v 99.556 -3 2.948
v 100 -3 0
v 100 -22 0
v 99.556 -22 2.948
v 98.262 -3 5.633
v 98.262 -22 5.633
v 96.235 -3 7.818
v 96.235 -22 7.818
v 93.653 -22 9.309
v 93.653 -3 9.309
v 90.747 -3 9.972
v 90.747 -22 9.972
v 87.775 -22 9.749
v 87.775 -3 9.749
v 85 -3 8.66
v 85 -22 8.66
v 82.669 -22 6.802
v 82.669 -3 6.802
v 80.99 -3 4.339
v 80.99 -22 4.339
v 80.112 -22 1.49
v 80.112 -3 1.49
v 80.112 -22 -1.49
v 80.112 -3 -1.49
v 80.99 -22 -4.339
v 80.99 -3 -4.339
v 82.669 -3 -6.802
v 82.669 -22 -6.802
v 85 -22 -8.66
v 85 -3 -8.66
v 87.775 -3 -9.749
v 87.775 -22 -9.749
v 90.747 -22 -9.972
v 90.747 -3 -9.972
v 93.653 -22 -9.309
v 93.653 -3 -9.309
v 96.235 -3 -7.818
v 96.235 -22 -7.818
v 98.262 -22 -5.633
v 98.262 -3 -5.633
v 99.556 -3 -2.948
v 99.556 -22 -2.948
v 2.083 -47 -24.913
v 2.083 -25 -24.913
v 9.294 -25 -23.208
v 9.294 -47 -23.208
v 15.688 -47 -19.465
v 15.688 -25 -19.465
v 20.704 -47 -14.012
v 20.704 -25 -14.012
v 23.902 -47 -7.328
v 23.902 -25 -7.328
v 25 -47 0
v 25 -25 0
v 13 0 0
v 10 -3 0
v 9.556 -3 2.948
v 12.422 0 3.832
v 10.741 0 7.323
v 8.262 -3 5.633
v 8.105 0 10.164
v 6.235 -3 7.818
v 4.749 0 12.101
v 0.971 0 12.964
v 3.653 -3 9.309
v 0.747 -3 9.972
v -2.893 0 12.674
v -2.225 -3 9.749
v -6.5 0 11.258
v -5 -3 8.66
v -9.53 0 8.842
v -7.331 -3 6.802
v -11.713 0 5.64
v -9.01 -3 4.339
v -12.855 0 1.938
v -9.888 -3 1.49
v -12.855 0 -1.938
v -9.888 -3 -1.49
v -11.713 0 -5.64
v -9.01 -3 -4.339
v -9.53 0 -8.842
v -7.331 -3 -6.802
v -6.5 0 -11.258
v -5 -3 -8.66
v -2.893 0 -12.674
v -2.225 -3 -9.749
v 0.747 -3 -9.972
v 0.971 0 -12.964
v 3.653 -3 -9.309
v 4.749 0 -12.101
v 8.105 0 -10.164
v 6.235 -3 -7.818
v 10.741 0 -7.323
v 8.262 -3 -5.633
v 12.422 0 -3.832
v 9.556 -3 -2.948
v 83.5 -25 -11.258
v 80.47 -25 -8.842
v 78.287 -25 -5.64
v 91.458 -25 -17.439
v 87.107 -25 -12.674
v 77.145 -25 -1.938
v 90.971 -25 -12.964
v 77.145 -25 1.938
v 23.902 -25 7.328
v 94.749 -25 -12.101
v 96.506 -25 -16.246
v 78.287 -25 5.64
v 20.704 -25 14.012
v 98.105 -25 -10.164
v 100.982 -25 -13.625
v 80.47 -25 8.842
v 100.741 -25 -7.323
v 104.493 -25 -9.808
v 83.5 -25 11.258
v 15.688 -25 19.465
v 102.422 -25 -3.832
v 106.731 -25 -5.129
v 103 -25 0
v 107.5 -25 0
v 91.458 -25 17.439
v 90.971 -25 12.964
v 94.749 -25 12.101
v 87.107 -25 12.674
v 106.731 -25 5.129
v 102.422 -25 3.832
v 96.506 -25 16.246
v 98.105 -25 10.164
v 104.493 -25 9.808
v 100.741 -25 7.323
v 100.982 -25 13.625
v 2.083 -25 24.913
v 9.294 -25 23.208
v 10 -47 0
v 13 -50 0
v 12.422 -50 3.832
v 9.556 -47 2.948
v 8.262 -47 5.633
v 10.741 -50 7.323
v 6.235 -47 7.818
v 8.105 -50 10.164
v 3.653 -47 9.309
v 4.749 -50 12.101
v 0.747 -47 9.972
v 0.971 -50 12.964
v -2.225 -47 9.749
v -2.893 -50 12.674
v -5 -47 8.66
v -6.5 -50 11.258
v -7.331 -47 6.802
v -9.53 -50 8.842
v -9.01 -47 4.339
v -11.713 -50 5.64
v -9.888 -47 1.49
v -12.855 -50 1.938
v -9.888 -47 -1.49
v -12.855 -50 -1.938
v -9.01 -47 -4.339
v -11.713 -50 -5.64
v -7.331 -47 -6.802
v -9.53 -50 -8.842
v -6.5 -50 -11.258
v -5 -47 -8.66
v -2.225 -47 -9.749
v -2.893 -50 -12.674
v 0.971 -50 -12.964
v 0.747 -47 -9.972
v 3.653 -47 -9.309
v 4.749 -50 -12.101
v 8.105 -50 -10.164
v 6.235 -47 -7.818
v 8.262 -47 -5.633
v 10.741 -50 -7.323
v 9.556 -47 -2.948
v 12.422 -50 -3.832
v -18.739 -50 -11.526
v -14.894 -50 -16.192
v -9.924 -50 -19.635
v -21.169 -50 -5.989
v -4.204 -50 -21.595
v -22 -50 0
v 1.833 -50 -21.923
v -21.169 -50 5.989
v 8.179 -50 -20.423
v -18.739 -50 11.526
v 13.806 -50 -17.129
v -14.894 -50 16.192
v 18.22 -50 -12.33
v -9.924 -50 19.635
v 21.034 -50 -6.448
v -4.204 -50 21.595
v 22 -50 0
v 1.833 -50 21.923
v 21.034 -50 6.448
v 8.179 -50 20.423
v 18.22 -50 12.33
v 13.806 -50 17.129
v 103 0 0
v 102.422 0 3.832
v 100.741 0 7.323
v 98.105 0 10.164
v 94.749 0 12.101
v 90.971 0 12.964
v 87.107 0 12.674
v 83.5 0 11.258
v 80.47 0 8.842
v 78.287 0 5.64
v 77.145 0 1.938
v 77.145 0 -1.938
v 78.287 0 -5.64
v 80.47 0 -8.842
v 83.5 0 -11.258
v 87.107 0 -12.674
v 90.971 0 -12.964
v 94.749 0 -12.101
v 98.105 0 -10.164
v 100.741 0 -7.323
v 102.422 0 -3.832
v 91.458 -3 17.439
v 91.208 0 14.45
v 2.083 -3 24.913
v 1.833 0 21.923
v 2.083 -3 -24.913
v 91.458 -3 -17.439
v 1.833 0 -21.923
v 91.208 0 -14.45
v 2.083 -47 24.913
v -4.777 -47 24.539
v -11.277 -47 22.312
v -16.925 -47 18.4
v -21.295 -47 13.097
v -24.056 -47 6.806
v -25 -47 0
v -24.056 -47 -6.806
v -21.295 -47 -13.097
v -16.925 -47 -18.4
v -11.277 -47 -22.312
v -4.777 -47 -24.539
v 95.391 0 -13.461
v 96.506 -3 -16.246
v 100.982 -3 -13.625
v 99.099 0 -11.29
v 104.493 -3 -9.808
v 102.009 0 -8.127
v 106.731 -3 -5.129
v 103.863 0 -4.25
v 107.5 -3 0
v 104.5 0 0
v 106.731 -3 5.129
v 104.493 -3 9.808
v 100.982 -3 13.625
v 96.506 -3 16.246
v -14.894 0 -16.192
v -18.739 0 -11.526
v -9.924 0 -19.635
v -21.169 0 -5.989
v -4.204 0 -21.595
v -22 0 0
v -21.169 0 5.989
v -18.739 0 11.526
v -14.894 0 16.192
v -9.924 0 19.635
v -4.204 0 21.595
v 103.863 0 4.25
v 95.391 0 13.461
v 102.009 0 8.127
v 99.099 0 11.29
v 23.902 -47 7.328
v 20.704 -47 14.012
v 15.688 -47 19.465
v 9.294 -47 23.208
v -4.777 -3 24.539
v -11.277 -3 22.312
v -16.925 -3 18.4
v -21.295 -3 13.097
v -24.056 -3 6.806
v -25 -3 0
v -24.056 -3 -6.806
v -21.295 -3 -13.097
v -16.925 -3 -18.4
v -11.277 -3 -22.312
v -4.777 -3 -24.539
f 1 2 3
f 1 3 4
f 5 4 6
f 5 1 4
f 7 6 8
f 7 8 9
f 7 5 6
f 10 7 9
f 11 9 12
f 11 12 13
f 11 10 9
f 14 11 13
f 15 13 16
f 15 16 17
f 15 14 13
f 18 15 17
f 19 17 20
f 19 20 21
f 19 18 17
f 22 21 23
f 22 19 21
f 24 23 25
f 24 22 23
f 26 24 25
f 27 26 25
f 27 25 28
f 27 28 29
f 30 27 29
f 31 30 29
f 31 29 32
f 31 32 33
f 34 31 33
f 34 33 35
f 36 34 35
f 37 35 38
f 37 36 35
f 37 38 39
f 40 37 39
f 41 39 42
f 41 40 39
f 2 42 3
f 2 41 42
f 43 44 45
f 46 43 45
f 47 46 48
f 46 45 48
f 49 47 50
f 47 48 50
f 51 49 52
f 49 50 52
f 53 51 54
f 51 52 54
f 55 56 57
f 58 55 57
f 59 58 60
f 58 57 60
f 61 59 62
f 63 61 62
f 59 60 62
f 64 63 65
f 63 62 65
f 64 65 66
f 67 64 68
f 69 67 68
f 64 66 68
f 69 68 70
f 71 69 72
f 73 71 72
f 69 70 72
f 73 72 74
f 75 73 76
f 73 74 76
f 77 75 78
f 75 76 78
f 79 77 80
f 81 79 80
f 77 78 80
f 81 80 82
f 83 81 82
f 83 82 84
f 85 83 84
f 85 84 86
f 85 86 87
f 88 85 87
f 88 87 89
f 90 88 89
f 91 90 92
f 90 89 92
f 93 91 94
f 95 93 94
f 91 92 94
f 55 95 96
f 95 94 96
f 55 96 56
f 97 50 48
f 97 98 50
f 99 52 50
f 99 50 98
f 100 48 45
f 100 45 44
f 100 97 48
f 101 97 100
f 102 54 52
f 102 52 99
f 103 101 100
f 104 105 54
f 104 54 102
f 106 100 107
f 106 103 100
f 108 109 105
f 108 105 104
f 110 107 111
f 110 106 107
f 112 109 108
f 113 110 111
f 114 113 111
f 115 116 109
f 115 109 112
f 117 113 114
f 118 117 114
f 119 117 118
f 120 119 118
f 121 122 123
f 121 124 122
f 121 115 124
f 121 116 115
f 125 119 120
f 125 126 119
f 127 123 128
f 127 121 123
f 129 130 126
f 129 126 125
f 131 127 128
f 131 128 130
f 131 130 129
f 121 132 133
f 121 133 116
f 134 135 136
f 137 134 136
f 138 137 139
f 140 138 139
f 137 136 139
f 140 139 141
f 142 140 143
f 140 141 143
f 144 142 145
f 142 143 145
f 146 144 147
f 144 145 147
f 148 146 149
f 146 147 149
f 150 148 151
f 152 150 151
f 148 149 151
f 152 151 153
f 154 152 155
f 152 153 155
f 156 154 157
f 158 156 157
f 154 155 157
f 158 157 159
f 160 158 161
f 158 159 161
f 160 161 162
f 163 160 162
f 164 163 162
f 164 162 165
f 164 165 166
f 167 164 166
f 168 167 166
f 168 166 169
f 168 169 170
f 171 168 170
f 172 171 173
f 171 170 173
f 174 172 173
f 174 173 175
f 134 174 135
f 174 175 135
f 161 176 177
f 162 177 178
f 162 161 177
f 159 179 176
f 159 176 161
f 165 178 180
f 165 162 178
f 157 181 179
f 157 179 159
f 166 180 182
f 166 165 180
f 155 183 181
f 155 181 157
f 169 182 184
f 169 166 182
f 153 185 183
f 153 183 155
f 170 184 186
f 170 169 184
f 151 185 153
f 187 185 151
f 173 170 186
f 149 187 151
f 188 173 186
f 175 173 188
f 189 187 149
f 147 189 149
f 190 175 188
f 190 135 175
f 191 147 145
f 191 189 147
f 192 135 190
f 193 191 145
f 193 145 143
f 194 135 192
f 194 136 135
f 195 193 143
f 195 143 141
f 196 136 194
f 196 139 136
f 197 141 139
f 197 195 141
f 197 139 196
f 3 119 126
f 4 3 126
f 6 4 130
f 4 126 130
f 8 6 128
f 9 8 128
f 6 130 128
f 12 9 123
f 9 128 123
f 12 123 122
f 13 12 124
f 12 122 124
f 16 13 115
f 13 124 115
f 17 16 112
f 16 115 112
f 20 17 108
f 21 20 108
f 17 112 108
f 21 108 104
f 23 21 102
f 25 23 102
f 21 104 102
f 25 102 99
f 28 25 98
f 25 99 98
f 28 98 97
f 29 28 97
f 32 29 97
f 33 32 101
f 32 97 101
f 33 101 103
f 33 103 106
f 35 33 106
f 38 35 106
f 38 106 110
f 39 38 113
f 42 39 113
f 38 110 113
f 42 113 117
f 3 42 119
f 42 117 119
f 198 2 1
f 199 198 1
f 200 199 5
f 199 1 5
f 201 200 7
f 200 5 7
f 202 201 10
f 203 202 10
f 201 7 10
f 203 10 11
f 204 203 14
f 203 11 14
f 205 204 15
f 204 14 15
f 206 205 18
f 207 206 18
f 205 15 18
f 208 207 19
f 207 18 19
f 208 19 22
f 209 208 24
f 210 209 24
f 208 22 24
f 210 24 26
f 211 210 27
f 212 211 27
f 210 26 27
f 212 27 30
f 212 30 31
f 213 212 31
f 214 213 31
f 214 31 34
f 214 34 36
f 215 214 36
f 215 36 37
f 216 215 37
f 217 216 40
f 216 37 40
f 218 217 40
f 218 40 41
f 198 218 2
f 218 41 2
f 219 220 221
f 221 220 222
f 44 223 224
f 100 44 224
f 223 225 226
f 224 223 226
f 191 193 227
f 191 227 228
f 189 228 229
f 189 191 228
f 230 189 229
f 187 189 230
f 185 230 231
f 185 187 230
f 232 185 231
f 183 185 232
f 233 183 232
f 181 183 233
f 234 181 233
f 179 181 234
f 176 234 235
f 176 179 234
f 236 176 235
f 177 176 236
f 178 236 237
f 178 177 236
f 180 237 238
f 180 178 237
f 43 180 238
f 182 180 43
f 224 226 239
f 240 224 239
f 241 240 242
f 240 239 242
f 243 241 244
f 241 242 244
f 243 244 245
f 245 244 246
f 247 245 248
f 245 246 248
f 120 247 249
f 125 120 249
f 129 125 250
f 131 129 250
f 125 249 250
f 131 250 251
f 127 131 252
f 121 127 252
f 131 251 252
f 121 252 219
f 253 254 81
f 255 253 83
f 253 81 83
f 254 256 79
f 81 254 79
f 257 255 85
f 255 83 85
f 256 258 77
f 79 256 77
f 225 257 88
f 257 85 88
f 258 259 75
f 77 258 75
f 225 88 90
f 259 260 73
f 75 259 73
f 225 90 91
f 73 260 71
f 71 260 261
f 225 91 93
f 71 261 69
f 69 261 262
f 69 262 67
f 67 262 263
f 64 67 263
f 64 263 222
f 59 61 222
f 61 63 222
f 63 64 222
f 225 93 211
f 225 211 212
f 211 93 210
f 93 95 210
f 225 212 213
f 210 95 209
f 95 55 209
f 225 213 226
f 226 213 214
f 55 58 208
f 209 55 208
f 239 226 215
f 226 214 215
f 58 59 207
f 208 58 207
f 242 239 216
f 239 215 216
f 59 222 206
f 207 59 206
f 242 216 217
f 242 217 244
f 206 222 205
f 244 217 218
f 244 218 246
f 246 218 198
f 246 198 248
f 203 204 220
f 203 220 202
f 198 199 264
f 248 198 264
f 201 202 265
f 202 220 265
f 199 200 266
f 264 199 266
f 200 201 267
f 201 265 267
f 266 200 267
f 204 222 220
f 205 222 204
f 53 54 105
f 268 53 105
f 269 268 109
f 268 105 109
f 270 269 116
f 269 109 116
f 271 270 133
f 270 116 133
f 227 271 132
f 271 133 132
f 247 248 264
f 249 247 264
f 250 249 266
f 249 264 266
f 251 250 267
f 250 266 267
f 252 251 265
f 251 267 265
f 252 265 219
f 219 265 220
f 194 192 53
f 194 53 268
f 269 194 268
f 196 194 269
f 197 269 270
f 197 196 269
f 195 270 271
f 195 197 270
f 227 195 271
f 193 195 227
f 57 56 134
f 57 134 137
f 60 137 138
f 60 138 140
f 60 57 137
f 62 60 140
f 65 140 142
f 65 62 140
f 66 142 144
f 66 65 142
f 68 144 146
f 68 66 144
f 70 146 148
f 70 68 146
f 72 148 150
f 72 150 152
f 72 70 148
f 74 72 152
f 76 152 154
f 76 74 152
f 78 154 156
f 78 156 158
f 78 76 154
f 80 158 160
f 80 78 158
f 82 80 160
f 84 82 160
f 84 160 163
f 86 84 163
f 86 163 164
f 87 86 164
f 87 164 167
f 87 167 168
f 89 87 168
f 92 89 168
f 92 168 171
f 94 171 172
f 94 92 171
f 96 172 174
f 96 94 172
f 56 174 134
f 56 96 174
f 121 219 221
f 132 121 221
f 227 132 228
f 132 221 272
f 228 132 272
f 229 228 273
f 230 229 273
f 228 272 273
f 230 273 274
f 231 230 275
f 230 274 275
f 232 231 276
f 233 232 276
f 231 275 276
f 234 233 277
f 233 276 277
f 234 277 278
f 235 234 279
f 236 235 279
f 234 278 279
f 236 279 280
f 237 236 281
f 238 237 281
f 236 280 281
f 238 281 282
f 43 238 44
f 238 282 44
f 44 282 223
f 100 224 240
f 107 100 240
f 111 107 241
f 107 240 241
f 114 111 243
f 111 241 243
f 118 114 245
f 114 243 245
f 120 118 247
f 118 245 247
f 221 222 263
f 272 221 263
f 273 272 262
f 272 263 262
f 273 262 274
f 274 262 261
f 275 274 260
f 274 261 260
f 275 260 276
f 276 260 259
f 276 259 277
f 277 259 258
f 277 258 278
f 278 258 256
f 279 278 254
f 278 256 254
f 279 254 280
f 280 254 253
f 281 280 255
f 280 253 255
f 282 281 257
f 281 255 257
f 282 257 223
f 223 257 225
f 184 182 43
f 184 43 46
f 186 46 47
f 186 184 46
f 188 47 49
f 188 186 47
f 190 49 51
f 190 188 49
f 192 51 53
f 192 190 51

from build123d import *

# Parameters (mm, degrees)
F0_R     = 10
F1_DEPTH = 25
F2_DEPTH = 50
F3_SIZE  = 3
F4_SIZE  = 3


with BuildPart() as f1:
    # F0 (on Front) → F1 (new body)
    with BuildSketch(Plane.XZ):
        with BuildLine():
            ThreePointArc((2.083333, -24.913043), (18.399502, -16.92508), (25, 0))
            ThreePointArc((25, 0), (18.399502, 16.92508), (2.083333, 24.913043))
            ThreePointArc((2.083333, 24.913043), (-25, 0), (2.083333, -24.913043))
        make_face()
        Circle(F0_R, mode=Mode.SUBTRACT)
        with BuildLine():
            ThreePointArc((2.083333, 24.913043), (18.399502, 16.92508), (25, 0))
            ThreePointArc((25, 0), (18.399502, -16.92508), (2.083333, -24.913043))
            Line((2.083333, -24.913043), (91.458333, -17.43913))
            ThreePointArc((91.458333, -17.43913), (72.5, 0), (91.458333, 17.43913))
            Line((91.458333, 17.43913), (2.083333, 24.913043))
        make_face()
        with BuildLine():
            ThreePointArc((107.5, 0), (102.879651, 11.847556), (91.458333, 17.43913))
            ThreePointArc((91.458333, 17.43913), (72.5, 0), (91.458333, -17.43913))
            ThreePointArc((91.458333, -17.43913), (102.879651, -11.847556), (107.5, 0))
        make_face()
        with Locations((90, 0)):
            Circle(F0_R, mode=Mode.SUBTRACT)
    extrude(amount=F1_DEPTH)

    # F0 (on Front) → F2 (join)
    with BuildSketch(Plane.XZ):
        with BuildLine():
            ThreePointArc((2.083333, -24.913043), (18.399502, -16.92508), (25, 0))
            ThreePointArc((25, 0), (18.399502, 16.92508), (2.083333, 24.913043))
            ThreePointArc((2.083333, 24.913043), (-25, 0), (2.083333, -24.913043))
        make_face()
        Circle(F0_R, mode=Mode.SUBTRACT)
    extrude(amount=F2_DEPTH)

    # F3
    f3_edges = [f1.edges().sort_by_distance(p)[0] for p in [
        (-2.083333, -50, 24.913043),
        (-10, -50, 0),
        (80, -25, 0),
    ]]
    chamfer(f3_edges, length=F3_SIZE)

    # F4
    f4_edges = [f1.edges().sort_by_distance(p)[0] for p in [
        (80, 0, 0),
        (-10, 0, 0),
        (-25, 0, 0),
        (46.770833, 0, -21.176087),
        (46.770833, 0, 21.176087),
        (107.5, 0, 0),
    ]]
    chamfer(f4_edges, length=F4_SIZE)


solid = f1.part
